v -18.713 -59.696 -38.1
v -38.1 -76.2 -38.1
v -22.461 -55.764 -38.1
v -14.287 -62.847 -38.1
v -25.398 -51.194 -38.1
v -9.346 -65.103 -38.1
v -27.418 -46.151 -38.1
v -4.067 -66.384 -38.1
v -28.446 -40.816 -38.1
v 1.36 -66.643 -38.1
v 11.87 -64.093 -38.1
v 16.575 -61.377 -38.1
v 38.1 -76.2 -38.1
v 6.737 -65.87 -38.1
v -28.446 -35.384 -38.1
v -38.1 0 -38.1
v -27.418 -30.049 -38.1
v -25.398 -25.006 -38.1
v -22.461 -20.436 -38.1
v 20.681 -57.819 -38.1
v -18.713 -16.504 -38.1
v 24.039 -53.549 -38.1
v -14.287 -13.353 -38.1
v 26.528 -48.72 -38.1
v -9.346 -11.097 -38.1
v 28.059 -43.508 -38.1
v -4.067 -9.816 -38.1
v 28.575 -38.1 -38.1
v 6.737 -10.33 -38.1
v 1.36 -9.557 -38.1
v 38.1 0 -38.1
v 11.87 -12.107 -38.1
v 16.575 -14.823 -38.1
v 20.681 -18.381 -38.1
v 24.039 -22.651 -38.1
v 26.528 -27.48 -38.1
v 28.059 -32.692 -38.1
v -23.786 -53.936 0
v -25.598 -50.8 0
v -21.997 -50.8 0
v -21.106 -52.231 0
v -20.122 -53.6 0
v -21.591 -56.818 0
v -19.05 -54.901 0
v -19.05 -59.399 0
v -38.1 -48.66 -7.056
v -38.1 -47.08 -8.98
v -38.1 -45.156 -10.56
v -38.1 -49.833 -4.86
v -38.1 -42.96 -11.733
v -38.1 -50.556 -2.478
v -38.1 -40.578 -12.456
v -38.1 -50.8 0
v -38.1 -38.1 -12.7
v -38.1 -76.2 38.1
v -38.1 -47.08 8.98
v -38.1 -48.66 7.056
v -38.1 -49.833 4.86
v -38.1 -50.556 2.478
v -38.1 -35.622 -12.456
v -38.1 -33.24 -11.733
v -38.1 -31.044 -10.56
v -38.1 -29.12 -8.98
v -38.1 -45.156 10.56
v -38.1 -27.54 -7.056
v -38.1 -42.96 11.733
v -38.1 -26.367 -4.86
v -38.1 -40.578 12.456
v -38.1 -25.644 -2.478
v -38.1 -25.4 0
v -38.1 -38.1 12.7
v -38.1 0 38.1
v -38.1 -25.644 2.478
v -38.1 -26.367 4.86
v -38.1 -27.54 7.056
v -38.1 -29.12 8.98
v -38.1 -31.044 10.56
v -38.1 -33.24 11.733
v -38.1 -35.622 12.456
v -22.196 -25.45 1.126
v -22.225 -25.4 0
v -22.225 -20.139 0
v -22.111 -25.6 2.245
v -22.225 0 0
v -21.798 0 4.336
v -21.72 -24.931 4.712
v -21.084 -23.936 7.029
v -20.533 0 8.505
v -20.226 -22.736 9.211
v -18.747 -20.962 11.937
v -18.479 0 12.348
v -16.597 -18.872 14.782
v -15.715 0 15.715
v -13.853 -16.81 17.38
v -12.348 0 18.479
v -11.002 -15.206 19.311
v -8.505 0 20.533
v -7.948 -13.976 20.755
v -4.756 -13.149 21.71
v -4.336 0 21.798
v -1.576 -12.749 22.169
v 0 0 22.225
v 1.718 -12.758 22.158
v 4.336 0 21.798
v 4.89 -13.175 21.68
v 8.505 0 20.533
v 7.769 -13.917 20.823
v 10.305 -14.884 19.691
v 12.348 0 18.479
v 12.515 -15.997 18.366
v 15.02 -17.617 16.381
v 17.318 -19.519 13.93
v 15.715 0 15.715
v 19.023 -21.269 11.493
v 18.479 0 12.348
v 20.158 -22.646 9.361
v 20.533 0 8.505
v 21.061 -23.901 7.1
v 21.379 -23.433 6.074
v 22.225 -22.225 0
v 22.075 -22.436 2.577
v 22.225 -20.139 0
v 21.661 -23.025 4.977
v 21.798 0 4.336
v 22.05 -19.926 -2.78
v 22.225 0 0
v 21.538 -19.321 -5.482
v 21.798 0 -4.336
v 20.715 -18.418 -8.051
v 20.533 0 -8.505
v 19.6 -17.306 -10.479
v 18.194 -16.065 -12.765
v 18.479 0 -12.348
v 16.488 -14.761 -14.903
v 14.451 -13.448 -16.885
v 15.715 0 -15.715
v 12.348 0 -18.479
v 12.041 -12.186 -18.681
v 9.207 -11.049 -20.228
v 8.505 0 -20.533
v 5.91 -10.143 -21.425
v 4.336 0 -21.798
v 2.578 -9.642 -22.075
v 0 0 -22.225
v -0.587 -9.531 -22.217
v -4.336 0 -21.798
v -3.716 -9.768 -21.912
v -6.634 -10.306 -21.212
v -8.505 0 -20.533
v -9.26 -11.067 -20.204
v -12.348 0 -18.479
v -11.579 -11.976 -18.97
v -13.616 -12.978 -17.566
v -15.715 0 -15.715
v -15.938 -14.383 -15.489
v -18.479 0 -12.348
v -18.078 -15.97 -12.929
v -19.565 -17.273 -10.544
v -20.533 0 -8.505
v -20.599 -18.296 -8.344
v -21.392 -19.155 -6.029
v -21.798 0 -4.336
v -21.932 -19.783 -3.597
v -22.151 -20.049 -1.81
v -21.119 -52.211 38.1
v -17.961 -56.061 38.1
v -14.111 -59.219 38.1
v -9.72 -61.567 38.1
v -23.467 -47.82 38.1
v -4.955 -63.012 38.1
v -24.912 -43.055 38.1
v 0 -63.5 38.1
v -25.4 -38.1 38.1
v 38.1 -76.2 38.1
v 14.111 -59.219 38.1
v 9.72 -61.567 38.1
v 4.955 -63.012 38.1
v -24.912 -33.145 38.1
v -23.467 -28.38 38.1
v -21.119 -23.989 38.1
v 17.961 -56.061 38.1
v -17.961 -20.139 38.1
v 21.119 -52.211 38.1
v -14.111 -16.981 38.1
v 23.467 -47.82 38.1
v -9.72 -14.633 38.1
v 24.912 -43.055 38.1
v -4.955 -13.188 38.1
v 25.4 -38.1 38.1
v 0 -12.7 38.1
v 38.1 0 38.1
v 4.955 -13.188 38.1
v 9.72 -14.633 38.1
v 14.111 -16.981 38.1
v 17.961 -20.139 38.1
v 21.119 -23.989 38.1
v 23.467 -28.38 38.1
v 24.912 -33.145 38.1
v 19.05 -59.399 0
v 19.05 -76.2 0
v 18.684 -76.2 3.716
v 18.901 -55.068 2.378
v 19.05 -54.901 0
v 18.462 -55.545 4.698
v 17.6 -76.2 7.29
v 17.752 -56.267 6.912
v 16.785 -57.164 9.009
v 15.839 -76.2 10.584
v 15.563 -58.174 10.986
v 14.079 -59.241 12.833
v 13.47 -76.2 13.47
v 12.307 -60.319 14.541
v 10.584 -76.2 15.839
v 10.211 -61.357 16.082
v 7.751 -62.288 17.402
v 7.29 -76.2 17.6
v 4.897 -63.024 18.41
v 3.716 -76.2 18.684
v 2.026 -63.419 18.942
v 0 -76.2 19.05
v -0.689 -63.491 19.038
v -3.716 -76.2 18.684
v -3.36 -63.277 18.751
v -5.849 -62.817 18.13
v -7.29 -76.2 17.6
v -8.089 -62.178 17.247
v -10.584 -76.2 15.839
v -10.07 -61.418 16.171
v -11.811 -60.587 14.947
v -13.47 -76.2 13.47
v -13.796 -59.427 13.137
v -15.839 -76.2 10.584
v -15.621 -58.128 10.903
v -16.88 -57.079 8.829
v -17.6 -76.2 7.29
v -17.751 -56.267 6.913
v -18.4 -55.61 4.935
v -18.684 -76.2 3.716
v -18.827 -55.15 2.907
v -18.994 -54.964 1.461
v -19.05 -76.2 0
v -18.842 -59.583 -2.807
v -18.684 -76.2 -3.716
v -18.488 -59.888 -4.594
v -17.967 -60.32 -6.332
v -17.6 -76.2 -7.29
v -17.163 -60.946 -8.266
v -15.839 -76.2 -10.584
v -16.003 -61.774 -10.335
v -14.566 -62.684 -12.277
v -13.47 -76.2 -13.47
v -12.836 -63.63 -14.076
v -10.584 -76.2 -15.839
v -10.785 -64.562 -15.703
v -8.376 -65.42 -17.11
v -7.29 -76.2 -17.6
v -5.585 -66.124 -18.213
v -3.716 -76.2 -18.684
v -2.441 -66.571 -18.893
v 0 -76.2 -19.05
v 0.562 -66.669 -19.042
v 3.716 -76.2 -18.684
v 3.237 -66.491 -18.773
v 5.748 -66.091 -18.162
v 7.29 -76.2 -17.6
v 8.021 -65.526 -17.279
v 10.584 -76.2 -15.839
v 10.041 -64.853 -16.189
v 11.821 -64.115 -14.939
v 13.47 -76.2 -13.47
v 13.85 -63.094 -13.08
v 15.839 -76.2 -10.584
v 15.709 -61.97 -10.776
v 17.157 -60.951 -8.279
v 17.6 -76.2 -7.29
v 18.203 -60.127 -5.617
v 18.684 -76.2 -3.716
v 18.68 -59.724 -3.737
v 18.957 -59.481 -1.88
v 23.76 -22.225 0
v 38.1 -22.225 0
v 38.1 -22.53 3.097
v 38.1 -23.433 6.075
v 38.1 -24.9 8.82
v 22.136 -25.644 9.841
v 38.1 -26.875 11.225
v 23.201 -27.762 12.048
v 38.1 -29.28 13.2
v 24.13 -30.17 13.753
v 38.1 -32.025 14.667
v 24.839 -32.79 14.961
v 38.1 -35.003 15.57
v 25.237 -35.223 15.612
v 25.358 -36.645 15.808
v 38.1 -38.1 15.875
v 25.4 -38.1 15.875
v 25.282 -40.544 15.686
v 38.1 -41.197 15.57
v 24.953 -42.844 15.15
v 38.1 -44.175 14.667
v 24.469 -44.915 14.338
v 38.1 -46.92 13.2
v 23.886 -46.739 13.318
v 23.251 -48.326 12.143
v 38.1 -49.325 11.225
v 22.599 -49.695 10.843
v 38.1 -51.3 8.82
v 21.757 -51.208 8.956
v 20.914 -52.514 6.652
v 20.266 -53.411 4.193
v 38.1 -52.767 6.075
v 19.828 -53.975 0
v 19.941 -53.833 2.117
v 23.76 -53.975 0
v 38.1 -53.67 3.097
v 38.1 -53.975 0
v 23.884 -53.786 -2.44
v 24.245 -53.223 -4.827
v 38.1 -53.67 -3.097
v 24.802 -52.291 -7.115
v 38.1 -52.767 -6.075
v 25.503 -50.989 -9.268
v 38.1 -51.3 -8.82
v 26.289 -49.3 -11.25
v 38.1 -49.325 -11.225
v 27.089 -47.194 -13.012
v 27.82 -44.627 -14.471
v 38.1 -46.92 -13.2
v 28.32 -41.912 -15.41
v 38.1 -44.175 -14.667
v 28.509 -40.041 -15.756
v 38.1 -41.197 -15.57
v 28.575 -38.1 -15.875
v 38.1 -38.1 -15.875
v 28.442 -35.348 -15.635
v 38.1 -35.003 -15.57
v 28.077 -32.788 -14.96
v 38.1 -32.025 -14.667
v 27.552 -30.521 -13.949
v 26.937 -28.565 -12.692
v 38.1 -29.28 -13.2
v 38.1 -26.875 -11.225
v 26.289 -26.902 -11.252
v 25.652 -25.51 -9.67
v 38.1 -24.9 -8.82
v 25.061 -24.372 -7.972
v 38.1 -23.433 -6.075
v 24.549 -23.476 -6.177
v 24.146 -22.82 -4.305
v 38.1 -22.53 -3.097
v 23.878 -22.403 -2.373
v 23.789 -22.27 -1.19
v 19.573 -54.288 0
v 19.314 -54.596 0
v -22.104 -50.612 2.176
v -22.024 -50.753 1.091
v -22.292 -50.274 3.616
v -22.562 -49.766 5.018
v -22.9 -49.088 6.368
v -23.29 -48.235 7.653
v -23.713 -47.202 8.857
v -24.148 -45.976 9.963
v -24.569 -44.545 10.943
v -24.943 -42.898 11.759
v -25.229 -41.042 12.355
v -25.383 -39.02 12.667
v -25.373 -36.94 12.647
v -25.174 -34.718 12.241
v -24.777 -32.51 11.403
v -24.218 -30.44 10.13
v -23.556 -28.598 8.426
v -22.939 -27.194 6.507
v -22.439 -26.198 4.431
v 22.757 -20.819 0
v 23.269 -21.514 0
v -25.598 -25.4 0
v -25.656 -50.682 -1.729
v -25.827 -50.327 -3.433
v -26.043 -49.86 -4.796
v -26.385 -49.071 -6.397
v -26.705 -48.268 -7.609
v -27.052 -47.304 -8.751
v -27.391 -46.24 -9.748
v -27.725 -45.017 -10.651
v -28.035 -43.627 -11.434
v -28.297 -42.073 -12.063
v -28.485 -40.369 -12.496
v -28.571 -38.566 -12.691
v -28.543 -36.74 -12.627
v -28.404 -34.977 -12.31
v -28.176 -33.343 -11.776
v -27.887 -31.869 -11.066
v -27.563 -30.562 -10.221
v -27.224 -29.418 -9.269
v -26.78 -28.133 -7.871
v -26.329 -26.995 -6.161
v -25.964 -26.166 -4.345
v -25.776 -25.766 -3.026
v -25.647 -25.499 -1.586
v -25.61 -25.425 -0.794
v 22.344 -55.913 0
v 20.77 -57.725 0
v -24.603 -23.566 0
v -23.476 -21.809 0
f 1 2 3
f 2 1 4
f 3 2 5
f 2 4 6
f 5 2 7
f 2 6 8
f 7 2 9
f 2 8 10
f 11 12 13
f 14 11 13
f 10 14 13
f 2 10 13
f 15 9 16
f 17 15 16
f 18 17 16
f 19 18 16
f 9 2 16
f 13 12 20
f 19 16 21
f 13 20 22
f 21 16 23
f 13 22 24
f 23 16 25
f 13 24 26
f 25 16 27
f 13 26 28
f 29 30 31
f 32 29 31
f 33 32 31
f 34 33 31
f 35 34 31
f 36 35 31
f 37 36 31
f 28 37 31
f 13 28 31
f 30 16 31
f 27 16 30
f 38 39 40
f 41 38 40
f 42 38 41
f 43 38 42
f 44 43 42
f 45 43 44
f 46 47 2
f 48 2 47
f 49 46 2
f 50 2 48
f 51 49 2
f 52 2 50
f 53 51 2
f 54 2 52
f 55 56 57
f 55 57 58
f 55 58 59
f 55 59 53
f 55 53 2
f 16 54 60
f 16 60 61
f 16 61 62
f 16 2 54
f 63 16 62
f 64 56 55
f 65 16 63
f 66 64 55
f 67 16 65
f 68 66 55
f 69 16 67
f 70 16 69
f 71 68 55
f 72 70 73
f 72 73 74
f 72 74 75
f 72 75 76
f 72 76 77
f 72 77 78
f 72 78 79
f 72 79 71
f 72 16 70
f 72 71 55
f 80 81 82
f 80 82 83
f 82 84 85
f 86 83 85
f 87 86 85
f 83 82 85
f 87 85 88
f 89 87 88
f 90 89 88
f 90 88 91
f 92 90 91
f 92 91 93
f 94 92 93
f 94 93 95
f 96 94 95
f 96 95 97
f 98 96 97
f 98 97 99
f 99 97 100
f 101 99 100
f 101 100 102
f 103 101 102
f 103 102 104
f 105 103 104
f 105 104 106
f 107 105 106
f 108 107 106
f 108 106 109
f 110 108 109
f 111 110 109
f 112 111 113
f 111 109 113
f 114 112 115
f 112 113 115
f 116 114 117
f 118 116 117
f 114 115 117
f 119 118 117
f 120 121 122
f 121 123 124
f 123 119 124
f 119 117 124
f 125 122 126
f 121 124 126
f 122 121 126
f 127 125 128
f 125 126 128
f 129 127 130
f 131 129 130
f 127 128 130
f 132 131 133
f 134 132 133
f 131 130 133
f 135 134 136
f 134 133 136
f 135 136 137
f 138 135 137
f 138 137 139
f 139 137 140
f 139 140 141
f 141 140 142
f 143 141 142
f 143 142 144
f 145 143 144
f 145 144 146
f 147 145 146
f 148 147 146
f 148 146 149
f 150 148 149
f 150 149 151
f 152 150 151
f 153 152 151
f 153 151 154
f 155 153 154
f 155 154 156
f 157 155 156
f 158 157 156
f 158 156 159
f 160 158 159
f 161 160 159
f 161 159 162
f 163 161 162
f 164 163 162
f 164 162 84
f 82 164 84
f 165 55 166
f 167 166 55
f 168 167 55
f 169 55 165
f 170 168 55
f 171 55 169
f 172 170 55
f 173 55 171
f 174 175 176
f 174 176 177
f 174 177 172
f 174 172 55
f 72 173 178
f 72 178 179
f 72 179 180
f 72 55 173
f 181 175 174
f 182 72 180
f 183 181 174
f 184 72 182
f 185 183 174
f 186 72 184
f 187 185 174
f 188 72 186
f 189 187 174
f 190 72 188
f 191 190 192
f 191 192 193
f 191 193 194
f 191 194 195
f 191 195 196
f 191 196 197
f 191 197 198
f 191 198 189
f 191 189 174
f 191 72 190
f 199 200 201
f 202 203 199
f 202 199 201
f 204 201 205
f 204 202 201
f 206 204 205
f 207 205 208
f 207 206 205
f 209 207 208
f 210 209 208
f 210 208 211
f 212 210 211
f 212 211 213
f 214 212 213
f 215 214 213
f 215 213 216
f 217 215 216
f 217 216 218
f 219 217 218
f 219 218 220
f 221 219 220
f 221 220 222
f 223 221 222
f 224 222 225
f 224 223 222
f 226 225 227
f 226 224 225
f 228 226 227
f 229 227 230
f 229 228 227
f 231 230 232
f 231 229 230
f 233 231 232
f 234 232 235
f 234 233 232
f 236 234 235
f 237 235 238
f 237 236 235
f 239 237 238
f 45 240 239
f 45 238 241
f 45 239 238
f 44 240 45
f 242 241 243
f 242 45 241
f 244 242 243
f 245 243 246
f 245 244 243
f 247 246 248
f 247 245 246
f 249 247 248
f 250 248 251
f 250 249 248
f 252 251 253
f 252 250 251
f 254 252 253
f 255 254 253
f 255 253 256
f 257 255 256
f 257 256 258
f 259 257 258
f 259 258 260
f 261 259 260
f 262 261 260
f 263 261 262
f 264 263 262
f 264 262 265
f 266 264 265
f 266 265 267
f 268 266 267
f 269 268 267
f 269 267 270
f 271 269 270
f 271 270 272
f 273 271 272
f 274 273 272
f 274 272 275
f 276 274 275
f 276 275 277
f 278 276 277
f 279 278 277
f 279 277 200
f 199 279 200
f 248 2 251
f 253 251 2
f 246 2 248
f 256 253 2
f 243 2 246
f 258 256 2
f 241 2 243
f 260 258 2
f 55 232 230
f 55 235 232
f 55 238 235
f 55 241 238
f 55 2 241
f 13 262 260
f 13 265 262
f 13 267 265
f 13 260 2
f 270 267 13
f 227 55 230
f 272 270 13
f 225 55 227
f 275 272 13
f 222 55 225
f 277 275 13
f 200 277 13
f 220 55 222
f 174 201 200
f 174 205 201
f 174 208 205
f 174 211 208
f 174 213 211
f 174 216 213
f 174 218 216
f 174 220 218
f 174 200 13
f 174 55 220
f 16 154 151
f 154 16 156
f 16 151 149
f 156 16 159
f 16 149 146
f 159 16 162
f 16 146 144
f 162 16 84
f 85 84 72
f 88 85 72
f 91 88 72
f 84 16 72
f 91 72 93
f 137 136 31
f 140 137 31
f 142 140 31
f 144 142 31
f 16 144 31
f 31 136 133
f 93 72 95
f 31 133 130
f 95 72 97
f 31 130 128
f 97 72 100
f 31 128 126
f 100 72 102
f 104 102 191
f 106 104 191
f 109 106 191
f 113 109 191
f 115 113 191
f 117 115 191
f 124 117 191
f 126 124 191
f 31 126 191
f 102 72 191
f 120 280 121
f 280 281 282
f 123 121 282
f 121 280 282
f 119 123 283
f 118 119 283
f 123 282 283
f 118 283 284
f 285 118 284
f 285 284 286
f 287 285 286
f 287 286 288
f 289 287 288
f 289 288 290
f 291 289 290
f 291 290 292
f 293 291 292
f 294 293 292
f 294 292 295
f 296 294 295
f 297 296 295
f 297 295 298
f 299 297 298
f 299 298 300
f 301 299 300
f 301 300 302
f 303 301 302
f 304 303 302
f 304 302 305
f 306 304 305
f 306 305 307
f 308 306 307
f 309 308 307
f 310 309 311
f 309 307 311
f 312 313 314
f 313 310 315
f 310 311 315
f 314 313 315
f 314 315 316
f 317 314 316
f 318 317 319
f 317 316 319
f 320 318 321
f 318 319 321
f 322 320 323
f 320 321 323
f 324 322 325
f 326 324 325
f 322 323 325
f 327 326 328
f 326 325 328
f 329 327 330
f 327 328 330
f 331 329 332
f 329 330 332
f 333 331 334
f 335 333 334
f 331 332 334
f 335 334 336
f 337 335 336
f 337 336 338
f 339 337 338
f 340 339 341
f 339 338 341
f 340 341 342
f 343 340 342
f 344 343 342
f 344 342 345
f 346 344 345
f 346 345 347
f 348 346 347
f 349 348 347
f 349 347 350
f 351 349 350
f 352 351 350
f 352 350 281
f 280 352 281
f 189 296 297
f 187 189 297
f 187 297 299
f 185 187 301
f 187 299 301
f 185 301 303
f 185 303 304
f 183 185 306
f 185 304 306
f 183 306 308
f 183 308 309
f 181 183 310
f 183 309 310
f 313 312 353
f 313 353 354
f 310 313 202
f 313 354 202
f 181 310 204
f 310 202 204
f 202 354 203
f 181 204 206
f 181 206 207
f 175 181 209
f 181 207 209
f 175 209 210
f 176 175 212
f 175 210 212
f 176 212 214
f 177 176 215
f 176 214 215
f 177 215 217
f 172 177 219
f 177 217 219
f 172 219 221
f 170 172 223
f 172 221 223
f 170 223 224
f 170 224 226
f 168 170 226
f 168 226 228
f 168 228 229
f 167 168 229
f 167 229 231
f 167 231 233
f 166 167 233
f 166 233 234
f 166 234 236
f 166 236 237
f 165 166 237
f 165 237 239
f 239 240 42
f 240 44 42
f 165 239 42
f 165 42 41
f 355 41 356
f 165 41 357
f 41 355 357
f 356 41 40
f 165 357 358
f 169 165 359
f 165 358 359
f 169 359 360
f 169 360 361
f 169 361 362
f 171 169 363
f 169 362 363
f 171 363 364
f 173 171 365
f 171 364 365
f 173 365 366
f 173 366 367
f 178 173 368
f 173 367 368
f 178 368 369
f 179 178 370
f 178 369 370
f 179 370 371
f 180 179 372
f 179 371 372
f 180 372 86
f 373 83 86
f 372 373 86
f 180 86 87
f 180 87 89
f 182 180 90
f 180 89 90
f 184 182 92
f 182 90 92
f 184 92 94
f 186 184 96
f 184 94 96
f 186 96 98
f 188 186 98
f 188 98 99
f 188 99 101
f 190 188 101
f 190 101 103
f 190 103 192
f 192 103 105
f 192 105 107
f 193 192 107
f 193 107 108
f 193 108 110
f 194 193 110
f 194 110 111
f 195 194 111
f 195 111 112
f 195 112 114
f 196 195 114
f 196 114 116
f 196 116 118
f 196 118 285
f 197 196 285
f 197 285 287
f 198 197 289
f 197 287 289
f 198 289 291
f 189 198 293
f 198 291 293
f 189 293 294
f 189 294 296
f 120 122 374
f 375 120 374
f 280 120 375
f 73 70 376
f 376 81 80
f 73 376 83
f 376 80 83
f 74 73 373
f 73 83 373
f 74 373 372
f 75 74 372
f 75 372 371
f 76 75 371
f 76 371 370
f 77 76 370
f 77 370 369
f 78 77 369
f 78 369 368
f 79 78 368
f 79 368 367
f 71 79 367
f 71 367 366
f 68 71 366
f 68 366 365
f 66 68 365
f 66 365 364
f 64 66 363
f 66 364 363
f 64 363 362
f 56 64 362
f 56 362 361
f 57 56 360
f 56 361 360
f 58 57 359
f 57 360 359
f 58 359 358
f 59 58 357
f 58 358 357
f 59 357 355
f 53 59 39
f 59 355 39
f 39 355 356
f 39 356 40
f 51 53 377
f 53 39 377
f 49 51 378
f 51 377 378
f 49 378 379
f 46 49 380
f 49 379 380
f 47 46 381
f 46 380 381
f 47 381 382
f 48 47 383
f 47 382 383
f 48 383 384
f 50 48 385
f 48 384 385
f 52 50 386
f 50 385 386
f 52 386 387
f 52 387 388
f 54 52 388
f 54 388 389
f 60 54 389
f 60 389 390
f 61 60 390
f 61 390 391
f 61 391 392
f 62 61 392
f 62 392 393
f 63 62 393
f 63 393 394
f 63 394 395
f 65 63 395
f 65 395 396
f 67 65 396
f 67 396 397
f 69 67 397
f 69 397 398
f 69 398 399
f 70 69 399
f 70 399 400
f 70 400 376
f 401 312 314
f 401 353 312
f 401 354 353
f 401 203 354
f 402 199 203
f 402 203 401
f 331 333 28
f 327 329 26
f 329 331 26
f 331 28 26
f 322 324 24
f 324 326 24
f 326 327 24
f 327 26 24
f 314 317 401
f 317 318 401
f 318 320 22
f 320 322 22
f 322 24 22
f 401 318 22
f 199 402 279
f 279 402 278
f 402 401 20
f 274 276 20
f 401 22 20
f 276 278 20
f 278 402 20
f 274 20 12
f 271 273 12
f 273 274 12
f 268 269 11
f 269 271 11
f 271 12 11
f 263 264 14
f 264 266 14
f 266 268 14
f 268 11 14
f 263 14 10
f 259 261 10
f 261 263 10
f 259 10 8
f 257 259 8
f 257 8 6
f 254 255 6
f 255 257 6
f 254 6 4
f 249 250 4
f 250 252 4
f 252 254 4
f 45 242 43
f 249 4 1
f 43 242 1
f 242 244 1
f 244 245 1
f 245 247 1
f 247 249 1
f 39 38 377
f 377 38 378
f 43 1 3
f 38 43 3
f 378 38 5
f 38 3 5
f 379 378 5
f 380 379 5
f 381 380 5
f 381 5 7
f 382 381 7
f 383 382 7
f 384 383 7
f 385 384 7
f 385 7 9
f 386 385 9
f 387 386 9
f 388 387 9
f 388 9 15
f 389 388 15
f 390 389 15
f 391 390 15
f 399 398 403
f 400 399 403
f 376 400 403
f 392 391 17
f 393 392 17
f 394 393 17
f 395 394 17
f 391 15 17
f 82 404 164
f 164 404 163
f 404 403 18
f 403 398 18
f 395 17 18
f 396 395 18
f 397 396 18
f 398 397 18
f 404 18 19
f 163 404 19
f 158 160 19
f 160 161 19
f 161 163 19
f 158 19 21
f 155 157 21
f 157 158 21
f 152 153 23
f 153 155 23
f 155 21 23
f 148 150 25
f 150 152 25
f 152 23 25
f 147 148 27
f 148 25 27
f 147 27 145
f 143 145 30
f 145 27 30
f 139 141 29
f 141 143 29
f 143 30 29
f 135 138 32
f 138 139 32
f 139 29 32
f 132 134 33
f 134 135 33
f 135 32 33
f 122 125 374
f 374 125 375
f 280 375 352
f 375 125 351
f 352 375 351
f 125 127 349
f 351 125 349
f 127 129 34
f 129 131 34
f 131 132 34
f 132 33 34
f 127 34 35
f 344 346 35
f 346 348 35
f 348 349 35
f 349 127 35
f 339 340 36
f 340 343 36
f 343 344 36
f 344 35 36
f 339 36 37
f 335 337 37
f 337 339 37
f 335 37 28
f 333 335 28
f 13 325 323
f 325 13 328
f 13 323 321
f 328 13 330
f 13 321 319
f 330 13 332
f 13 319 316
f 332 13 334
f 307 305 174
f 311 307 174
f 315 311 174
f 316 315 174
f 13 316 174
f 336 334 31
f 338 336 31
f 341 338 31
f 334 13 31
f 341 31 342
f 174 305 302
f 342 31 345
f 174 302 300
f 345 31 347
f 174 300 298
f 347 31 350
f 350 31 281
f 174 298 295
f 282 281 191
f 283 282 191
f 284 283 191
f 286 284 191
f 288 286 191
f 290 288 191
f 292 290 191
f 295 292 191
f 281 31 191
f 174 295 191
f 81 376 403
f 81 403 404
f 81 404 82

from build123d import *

# Parameters (mm, degrees)
F0_W      = 76.2
F0_H      = 76.2
F0_R      = 19.05
F1_DEPTH  = 76.2
F2_R      = 12.7
F3_DEPTH  = 76.2
F4_R      = 25.4
F5_DEPTH  = 76.2
F6_R      = 22.225
F6_R_2    = 19.05
F7_DEPTH  = 38.1
F8_R      = 28.575
F9_DEPTH  = 38.1
F10_R     = 15.875
F11_DEPTH = 38.1


with BuildPart() as f1:
    # F0 (on Front) → F1 (new body)
    with BuildSketch(Plane.XZ):
        Rectangle(F0_W, F0_H)
        Circle(F0_R, mode=Mode.SUBTRACT)
    extrude(amount=F1_DEPTH)

    # F2 (on face) → F3 (cut)
    with BuildSketch(Plane.YZ.offset(38.1)):
        with Locations((-38.1, 0)):
            Circle(F2_R)
    extrude(amount=-F3_DEPTH, mode=Mode.SUBTRACT)

    # F4 (on face) → F5 (cut)
    with BuildSketch(Plane(origin=(0, 0, -38.1), x_dir=(1, 0, 0), z_dir=(0, 0, -1))):
        with Locations((0, 38.1)):
            Circle(F4_R)
    extrude(amount=-F5_DEPTH, mode=Mode.SUBTRACT)

    # F6 (on face) → F7 (cut)
    with BuildSketch(Plane(origin=(0, 0, 0), x_dir=(-1, 0, 0), z_dir=(0, 1, 0))):
        Circle(F6_R)
        Circle(F6_R_2, mode=Mode.SUBTRACT)
    extrude(amount=-F7_DEPTH, mode=Mode.SUBTRACT)

    # F8 (on face) → F9 (cut)
    with BuildSketch(Plane(origin=(0, 0, -38.1), x_dir=(1, 0, 0), z_dir=(0, 0, -1))):
        with Locations((0, 38.1)):
            Circle(F8_R)
    extrude(amount=-F9_DEPTH, mode=Mode.SUBTRACT)

    # F10 (on face) → F11 (cut)
    with BuildSketch(Plane.YZ.offset(38.1)):
        with Locations((-38.1, 0)):
            Circle(F10_R)
    extrude(amount=-F11_DEPTH, mode=Mode.SUBTRACT)


solid = f1.part
